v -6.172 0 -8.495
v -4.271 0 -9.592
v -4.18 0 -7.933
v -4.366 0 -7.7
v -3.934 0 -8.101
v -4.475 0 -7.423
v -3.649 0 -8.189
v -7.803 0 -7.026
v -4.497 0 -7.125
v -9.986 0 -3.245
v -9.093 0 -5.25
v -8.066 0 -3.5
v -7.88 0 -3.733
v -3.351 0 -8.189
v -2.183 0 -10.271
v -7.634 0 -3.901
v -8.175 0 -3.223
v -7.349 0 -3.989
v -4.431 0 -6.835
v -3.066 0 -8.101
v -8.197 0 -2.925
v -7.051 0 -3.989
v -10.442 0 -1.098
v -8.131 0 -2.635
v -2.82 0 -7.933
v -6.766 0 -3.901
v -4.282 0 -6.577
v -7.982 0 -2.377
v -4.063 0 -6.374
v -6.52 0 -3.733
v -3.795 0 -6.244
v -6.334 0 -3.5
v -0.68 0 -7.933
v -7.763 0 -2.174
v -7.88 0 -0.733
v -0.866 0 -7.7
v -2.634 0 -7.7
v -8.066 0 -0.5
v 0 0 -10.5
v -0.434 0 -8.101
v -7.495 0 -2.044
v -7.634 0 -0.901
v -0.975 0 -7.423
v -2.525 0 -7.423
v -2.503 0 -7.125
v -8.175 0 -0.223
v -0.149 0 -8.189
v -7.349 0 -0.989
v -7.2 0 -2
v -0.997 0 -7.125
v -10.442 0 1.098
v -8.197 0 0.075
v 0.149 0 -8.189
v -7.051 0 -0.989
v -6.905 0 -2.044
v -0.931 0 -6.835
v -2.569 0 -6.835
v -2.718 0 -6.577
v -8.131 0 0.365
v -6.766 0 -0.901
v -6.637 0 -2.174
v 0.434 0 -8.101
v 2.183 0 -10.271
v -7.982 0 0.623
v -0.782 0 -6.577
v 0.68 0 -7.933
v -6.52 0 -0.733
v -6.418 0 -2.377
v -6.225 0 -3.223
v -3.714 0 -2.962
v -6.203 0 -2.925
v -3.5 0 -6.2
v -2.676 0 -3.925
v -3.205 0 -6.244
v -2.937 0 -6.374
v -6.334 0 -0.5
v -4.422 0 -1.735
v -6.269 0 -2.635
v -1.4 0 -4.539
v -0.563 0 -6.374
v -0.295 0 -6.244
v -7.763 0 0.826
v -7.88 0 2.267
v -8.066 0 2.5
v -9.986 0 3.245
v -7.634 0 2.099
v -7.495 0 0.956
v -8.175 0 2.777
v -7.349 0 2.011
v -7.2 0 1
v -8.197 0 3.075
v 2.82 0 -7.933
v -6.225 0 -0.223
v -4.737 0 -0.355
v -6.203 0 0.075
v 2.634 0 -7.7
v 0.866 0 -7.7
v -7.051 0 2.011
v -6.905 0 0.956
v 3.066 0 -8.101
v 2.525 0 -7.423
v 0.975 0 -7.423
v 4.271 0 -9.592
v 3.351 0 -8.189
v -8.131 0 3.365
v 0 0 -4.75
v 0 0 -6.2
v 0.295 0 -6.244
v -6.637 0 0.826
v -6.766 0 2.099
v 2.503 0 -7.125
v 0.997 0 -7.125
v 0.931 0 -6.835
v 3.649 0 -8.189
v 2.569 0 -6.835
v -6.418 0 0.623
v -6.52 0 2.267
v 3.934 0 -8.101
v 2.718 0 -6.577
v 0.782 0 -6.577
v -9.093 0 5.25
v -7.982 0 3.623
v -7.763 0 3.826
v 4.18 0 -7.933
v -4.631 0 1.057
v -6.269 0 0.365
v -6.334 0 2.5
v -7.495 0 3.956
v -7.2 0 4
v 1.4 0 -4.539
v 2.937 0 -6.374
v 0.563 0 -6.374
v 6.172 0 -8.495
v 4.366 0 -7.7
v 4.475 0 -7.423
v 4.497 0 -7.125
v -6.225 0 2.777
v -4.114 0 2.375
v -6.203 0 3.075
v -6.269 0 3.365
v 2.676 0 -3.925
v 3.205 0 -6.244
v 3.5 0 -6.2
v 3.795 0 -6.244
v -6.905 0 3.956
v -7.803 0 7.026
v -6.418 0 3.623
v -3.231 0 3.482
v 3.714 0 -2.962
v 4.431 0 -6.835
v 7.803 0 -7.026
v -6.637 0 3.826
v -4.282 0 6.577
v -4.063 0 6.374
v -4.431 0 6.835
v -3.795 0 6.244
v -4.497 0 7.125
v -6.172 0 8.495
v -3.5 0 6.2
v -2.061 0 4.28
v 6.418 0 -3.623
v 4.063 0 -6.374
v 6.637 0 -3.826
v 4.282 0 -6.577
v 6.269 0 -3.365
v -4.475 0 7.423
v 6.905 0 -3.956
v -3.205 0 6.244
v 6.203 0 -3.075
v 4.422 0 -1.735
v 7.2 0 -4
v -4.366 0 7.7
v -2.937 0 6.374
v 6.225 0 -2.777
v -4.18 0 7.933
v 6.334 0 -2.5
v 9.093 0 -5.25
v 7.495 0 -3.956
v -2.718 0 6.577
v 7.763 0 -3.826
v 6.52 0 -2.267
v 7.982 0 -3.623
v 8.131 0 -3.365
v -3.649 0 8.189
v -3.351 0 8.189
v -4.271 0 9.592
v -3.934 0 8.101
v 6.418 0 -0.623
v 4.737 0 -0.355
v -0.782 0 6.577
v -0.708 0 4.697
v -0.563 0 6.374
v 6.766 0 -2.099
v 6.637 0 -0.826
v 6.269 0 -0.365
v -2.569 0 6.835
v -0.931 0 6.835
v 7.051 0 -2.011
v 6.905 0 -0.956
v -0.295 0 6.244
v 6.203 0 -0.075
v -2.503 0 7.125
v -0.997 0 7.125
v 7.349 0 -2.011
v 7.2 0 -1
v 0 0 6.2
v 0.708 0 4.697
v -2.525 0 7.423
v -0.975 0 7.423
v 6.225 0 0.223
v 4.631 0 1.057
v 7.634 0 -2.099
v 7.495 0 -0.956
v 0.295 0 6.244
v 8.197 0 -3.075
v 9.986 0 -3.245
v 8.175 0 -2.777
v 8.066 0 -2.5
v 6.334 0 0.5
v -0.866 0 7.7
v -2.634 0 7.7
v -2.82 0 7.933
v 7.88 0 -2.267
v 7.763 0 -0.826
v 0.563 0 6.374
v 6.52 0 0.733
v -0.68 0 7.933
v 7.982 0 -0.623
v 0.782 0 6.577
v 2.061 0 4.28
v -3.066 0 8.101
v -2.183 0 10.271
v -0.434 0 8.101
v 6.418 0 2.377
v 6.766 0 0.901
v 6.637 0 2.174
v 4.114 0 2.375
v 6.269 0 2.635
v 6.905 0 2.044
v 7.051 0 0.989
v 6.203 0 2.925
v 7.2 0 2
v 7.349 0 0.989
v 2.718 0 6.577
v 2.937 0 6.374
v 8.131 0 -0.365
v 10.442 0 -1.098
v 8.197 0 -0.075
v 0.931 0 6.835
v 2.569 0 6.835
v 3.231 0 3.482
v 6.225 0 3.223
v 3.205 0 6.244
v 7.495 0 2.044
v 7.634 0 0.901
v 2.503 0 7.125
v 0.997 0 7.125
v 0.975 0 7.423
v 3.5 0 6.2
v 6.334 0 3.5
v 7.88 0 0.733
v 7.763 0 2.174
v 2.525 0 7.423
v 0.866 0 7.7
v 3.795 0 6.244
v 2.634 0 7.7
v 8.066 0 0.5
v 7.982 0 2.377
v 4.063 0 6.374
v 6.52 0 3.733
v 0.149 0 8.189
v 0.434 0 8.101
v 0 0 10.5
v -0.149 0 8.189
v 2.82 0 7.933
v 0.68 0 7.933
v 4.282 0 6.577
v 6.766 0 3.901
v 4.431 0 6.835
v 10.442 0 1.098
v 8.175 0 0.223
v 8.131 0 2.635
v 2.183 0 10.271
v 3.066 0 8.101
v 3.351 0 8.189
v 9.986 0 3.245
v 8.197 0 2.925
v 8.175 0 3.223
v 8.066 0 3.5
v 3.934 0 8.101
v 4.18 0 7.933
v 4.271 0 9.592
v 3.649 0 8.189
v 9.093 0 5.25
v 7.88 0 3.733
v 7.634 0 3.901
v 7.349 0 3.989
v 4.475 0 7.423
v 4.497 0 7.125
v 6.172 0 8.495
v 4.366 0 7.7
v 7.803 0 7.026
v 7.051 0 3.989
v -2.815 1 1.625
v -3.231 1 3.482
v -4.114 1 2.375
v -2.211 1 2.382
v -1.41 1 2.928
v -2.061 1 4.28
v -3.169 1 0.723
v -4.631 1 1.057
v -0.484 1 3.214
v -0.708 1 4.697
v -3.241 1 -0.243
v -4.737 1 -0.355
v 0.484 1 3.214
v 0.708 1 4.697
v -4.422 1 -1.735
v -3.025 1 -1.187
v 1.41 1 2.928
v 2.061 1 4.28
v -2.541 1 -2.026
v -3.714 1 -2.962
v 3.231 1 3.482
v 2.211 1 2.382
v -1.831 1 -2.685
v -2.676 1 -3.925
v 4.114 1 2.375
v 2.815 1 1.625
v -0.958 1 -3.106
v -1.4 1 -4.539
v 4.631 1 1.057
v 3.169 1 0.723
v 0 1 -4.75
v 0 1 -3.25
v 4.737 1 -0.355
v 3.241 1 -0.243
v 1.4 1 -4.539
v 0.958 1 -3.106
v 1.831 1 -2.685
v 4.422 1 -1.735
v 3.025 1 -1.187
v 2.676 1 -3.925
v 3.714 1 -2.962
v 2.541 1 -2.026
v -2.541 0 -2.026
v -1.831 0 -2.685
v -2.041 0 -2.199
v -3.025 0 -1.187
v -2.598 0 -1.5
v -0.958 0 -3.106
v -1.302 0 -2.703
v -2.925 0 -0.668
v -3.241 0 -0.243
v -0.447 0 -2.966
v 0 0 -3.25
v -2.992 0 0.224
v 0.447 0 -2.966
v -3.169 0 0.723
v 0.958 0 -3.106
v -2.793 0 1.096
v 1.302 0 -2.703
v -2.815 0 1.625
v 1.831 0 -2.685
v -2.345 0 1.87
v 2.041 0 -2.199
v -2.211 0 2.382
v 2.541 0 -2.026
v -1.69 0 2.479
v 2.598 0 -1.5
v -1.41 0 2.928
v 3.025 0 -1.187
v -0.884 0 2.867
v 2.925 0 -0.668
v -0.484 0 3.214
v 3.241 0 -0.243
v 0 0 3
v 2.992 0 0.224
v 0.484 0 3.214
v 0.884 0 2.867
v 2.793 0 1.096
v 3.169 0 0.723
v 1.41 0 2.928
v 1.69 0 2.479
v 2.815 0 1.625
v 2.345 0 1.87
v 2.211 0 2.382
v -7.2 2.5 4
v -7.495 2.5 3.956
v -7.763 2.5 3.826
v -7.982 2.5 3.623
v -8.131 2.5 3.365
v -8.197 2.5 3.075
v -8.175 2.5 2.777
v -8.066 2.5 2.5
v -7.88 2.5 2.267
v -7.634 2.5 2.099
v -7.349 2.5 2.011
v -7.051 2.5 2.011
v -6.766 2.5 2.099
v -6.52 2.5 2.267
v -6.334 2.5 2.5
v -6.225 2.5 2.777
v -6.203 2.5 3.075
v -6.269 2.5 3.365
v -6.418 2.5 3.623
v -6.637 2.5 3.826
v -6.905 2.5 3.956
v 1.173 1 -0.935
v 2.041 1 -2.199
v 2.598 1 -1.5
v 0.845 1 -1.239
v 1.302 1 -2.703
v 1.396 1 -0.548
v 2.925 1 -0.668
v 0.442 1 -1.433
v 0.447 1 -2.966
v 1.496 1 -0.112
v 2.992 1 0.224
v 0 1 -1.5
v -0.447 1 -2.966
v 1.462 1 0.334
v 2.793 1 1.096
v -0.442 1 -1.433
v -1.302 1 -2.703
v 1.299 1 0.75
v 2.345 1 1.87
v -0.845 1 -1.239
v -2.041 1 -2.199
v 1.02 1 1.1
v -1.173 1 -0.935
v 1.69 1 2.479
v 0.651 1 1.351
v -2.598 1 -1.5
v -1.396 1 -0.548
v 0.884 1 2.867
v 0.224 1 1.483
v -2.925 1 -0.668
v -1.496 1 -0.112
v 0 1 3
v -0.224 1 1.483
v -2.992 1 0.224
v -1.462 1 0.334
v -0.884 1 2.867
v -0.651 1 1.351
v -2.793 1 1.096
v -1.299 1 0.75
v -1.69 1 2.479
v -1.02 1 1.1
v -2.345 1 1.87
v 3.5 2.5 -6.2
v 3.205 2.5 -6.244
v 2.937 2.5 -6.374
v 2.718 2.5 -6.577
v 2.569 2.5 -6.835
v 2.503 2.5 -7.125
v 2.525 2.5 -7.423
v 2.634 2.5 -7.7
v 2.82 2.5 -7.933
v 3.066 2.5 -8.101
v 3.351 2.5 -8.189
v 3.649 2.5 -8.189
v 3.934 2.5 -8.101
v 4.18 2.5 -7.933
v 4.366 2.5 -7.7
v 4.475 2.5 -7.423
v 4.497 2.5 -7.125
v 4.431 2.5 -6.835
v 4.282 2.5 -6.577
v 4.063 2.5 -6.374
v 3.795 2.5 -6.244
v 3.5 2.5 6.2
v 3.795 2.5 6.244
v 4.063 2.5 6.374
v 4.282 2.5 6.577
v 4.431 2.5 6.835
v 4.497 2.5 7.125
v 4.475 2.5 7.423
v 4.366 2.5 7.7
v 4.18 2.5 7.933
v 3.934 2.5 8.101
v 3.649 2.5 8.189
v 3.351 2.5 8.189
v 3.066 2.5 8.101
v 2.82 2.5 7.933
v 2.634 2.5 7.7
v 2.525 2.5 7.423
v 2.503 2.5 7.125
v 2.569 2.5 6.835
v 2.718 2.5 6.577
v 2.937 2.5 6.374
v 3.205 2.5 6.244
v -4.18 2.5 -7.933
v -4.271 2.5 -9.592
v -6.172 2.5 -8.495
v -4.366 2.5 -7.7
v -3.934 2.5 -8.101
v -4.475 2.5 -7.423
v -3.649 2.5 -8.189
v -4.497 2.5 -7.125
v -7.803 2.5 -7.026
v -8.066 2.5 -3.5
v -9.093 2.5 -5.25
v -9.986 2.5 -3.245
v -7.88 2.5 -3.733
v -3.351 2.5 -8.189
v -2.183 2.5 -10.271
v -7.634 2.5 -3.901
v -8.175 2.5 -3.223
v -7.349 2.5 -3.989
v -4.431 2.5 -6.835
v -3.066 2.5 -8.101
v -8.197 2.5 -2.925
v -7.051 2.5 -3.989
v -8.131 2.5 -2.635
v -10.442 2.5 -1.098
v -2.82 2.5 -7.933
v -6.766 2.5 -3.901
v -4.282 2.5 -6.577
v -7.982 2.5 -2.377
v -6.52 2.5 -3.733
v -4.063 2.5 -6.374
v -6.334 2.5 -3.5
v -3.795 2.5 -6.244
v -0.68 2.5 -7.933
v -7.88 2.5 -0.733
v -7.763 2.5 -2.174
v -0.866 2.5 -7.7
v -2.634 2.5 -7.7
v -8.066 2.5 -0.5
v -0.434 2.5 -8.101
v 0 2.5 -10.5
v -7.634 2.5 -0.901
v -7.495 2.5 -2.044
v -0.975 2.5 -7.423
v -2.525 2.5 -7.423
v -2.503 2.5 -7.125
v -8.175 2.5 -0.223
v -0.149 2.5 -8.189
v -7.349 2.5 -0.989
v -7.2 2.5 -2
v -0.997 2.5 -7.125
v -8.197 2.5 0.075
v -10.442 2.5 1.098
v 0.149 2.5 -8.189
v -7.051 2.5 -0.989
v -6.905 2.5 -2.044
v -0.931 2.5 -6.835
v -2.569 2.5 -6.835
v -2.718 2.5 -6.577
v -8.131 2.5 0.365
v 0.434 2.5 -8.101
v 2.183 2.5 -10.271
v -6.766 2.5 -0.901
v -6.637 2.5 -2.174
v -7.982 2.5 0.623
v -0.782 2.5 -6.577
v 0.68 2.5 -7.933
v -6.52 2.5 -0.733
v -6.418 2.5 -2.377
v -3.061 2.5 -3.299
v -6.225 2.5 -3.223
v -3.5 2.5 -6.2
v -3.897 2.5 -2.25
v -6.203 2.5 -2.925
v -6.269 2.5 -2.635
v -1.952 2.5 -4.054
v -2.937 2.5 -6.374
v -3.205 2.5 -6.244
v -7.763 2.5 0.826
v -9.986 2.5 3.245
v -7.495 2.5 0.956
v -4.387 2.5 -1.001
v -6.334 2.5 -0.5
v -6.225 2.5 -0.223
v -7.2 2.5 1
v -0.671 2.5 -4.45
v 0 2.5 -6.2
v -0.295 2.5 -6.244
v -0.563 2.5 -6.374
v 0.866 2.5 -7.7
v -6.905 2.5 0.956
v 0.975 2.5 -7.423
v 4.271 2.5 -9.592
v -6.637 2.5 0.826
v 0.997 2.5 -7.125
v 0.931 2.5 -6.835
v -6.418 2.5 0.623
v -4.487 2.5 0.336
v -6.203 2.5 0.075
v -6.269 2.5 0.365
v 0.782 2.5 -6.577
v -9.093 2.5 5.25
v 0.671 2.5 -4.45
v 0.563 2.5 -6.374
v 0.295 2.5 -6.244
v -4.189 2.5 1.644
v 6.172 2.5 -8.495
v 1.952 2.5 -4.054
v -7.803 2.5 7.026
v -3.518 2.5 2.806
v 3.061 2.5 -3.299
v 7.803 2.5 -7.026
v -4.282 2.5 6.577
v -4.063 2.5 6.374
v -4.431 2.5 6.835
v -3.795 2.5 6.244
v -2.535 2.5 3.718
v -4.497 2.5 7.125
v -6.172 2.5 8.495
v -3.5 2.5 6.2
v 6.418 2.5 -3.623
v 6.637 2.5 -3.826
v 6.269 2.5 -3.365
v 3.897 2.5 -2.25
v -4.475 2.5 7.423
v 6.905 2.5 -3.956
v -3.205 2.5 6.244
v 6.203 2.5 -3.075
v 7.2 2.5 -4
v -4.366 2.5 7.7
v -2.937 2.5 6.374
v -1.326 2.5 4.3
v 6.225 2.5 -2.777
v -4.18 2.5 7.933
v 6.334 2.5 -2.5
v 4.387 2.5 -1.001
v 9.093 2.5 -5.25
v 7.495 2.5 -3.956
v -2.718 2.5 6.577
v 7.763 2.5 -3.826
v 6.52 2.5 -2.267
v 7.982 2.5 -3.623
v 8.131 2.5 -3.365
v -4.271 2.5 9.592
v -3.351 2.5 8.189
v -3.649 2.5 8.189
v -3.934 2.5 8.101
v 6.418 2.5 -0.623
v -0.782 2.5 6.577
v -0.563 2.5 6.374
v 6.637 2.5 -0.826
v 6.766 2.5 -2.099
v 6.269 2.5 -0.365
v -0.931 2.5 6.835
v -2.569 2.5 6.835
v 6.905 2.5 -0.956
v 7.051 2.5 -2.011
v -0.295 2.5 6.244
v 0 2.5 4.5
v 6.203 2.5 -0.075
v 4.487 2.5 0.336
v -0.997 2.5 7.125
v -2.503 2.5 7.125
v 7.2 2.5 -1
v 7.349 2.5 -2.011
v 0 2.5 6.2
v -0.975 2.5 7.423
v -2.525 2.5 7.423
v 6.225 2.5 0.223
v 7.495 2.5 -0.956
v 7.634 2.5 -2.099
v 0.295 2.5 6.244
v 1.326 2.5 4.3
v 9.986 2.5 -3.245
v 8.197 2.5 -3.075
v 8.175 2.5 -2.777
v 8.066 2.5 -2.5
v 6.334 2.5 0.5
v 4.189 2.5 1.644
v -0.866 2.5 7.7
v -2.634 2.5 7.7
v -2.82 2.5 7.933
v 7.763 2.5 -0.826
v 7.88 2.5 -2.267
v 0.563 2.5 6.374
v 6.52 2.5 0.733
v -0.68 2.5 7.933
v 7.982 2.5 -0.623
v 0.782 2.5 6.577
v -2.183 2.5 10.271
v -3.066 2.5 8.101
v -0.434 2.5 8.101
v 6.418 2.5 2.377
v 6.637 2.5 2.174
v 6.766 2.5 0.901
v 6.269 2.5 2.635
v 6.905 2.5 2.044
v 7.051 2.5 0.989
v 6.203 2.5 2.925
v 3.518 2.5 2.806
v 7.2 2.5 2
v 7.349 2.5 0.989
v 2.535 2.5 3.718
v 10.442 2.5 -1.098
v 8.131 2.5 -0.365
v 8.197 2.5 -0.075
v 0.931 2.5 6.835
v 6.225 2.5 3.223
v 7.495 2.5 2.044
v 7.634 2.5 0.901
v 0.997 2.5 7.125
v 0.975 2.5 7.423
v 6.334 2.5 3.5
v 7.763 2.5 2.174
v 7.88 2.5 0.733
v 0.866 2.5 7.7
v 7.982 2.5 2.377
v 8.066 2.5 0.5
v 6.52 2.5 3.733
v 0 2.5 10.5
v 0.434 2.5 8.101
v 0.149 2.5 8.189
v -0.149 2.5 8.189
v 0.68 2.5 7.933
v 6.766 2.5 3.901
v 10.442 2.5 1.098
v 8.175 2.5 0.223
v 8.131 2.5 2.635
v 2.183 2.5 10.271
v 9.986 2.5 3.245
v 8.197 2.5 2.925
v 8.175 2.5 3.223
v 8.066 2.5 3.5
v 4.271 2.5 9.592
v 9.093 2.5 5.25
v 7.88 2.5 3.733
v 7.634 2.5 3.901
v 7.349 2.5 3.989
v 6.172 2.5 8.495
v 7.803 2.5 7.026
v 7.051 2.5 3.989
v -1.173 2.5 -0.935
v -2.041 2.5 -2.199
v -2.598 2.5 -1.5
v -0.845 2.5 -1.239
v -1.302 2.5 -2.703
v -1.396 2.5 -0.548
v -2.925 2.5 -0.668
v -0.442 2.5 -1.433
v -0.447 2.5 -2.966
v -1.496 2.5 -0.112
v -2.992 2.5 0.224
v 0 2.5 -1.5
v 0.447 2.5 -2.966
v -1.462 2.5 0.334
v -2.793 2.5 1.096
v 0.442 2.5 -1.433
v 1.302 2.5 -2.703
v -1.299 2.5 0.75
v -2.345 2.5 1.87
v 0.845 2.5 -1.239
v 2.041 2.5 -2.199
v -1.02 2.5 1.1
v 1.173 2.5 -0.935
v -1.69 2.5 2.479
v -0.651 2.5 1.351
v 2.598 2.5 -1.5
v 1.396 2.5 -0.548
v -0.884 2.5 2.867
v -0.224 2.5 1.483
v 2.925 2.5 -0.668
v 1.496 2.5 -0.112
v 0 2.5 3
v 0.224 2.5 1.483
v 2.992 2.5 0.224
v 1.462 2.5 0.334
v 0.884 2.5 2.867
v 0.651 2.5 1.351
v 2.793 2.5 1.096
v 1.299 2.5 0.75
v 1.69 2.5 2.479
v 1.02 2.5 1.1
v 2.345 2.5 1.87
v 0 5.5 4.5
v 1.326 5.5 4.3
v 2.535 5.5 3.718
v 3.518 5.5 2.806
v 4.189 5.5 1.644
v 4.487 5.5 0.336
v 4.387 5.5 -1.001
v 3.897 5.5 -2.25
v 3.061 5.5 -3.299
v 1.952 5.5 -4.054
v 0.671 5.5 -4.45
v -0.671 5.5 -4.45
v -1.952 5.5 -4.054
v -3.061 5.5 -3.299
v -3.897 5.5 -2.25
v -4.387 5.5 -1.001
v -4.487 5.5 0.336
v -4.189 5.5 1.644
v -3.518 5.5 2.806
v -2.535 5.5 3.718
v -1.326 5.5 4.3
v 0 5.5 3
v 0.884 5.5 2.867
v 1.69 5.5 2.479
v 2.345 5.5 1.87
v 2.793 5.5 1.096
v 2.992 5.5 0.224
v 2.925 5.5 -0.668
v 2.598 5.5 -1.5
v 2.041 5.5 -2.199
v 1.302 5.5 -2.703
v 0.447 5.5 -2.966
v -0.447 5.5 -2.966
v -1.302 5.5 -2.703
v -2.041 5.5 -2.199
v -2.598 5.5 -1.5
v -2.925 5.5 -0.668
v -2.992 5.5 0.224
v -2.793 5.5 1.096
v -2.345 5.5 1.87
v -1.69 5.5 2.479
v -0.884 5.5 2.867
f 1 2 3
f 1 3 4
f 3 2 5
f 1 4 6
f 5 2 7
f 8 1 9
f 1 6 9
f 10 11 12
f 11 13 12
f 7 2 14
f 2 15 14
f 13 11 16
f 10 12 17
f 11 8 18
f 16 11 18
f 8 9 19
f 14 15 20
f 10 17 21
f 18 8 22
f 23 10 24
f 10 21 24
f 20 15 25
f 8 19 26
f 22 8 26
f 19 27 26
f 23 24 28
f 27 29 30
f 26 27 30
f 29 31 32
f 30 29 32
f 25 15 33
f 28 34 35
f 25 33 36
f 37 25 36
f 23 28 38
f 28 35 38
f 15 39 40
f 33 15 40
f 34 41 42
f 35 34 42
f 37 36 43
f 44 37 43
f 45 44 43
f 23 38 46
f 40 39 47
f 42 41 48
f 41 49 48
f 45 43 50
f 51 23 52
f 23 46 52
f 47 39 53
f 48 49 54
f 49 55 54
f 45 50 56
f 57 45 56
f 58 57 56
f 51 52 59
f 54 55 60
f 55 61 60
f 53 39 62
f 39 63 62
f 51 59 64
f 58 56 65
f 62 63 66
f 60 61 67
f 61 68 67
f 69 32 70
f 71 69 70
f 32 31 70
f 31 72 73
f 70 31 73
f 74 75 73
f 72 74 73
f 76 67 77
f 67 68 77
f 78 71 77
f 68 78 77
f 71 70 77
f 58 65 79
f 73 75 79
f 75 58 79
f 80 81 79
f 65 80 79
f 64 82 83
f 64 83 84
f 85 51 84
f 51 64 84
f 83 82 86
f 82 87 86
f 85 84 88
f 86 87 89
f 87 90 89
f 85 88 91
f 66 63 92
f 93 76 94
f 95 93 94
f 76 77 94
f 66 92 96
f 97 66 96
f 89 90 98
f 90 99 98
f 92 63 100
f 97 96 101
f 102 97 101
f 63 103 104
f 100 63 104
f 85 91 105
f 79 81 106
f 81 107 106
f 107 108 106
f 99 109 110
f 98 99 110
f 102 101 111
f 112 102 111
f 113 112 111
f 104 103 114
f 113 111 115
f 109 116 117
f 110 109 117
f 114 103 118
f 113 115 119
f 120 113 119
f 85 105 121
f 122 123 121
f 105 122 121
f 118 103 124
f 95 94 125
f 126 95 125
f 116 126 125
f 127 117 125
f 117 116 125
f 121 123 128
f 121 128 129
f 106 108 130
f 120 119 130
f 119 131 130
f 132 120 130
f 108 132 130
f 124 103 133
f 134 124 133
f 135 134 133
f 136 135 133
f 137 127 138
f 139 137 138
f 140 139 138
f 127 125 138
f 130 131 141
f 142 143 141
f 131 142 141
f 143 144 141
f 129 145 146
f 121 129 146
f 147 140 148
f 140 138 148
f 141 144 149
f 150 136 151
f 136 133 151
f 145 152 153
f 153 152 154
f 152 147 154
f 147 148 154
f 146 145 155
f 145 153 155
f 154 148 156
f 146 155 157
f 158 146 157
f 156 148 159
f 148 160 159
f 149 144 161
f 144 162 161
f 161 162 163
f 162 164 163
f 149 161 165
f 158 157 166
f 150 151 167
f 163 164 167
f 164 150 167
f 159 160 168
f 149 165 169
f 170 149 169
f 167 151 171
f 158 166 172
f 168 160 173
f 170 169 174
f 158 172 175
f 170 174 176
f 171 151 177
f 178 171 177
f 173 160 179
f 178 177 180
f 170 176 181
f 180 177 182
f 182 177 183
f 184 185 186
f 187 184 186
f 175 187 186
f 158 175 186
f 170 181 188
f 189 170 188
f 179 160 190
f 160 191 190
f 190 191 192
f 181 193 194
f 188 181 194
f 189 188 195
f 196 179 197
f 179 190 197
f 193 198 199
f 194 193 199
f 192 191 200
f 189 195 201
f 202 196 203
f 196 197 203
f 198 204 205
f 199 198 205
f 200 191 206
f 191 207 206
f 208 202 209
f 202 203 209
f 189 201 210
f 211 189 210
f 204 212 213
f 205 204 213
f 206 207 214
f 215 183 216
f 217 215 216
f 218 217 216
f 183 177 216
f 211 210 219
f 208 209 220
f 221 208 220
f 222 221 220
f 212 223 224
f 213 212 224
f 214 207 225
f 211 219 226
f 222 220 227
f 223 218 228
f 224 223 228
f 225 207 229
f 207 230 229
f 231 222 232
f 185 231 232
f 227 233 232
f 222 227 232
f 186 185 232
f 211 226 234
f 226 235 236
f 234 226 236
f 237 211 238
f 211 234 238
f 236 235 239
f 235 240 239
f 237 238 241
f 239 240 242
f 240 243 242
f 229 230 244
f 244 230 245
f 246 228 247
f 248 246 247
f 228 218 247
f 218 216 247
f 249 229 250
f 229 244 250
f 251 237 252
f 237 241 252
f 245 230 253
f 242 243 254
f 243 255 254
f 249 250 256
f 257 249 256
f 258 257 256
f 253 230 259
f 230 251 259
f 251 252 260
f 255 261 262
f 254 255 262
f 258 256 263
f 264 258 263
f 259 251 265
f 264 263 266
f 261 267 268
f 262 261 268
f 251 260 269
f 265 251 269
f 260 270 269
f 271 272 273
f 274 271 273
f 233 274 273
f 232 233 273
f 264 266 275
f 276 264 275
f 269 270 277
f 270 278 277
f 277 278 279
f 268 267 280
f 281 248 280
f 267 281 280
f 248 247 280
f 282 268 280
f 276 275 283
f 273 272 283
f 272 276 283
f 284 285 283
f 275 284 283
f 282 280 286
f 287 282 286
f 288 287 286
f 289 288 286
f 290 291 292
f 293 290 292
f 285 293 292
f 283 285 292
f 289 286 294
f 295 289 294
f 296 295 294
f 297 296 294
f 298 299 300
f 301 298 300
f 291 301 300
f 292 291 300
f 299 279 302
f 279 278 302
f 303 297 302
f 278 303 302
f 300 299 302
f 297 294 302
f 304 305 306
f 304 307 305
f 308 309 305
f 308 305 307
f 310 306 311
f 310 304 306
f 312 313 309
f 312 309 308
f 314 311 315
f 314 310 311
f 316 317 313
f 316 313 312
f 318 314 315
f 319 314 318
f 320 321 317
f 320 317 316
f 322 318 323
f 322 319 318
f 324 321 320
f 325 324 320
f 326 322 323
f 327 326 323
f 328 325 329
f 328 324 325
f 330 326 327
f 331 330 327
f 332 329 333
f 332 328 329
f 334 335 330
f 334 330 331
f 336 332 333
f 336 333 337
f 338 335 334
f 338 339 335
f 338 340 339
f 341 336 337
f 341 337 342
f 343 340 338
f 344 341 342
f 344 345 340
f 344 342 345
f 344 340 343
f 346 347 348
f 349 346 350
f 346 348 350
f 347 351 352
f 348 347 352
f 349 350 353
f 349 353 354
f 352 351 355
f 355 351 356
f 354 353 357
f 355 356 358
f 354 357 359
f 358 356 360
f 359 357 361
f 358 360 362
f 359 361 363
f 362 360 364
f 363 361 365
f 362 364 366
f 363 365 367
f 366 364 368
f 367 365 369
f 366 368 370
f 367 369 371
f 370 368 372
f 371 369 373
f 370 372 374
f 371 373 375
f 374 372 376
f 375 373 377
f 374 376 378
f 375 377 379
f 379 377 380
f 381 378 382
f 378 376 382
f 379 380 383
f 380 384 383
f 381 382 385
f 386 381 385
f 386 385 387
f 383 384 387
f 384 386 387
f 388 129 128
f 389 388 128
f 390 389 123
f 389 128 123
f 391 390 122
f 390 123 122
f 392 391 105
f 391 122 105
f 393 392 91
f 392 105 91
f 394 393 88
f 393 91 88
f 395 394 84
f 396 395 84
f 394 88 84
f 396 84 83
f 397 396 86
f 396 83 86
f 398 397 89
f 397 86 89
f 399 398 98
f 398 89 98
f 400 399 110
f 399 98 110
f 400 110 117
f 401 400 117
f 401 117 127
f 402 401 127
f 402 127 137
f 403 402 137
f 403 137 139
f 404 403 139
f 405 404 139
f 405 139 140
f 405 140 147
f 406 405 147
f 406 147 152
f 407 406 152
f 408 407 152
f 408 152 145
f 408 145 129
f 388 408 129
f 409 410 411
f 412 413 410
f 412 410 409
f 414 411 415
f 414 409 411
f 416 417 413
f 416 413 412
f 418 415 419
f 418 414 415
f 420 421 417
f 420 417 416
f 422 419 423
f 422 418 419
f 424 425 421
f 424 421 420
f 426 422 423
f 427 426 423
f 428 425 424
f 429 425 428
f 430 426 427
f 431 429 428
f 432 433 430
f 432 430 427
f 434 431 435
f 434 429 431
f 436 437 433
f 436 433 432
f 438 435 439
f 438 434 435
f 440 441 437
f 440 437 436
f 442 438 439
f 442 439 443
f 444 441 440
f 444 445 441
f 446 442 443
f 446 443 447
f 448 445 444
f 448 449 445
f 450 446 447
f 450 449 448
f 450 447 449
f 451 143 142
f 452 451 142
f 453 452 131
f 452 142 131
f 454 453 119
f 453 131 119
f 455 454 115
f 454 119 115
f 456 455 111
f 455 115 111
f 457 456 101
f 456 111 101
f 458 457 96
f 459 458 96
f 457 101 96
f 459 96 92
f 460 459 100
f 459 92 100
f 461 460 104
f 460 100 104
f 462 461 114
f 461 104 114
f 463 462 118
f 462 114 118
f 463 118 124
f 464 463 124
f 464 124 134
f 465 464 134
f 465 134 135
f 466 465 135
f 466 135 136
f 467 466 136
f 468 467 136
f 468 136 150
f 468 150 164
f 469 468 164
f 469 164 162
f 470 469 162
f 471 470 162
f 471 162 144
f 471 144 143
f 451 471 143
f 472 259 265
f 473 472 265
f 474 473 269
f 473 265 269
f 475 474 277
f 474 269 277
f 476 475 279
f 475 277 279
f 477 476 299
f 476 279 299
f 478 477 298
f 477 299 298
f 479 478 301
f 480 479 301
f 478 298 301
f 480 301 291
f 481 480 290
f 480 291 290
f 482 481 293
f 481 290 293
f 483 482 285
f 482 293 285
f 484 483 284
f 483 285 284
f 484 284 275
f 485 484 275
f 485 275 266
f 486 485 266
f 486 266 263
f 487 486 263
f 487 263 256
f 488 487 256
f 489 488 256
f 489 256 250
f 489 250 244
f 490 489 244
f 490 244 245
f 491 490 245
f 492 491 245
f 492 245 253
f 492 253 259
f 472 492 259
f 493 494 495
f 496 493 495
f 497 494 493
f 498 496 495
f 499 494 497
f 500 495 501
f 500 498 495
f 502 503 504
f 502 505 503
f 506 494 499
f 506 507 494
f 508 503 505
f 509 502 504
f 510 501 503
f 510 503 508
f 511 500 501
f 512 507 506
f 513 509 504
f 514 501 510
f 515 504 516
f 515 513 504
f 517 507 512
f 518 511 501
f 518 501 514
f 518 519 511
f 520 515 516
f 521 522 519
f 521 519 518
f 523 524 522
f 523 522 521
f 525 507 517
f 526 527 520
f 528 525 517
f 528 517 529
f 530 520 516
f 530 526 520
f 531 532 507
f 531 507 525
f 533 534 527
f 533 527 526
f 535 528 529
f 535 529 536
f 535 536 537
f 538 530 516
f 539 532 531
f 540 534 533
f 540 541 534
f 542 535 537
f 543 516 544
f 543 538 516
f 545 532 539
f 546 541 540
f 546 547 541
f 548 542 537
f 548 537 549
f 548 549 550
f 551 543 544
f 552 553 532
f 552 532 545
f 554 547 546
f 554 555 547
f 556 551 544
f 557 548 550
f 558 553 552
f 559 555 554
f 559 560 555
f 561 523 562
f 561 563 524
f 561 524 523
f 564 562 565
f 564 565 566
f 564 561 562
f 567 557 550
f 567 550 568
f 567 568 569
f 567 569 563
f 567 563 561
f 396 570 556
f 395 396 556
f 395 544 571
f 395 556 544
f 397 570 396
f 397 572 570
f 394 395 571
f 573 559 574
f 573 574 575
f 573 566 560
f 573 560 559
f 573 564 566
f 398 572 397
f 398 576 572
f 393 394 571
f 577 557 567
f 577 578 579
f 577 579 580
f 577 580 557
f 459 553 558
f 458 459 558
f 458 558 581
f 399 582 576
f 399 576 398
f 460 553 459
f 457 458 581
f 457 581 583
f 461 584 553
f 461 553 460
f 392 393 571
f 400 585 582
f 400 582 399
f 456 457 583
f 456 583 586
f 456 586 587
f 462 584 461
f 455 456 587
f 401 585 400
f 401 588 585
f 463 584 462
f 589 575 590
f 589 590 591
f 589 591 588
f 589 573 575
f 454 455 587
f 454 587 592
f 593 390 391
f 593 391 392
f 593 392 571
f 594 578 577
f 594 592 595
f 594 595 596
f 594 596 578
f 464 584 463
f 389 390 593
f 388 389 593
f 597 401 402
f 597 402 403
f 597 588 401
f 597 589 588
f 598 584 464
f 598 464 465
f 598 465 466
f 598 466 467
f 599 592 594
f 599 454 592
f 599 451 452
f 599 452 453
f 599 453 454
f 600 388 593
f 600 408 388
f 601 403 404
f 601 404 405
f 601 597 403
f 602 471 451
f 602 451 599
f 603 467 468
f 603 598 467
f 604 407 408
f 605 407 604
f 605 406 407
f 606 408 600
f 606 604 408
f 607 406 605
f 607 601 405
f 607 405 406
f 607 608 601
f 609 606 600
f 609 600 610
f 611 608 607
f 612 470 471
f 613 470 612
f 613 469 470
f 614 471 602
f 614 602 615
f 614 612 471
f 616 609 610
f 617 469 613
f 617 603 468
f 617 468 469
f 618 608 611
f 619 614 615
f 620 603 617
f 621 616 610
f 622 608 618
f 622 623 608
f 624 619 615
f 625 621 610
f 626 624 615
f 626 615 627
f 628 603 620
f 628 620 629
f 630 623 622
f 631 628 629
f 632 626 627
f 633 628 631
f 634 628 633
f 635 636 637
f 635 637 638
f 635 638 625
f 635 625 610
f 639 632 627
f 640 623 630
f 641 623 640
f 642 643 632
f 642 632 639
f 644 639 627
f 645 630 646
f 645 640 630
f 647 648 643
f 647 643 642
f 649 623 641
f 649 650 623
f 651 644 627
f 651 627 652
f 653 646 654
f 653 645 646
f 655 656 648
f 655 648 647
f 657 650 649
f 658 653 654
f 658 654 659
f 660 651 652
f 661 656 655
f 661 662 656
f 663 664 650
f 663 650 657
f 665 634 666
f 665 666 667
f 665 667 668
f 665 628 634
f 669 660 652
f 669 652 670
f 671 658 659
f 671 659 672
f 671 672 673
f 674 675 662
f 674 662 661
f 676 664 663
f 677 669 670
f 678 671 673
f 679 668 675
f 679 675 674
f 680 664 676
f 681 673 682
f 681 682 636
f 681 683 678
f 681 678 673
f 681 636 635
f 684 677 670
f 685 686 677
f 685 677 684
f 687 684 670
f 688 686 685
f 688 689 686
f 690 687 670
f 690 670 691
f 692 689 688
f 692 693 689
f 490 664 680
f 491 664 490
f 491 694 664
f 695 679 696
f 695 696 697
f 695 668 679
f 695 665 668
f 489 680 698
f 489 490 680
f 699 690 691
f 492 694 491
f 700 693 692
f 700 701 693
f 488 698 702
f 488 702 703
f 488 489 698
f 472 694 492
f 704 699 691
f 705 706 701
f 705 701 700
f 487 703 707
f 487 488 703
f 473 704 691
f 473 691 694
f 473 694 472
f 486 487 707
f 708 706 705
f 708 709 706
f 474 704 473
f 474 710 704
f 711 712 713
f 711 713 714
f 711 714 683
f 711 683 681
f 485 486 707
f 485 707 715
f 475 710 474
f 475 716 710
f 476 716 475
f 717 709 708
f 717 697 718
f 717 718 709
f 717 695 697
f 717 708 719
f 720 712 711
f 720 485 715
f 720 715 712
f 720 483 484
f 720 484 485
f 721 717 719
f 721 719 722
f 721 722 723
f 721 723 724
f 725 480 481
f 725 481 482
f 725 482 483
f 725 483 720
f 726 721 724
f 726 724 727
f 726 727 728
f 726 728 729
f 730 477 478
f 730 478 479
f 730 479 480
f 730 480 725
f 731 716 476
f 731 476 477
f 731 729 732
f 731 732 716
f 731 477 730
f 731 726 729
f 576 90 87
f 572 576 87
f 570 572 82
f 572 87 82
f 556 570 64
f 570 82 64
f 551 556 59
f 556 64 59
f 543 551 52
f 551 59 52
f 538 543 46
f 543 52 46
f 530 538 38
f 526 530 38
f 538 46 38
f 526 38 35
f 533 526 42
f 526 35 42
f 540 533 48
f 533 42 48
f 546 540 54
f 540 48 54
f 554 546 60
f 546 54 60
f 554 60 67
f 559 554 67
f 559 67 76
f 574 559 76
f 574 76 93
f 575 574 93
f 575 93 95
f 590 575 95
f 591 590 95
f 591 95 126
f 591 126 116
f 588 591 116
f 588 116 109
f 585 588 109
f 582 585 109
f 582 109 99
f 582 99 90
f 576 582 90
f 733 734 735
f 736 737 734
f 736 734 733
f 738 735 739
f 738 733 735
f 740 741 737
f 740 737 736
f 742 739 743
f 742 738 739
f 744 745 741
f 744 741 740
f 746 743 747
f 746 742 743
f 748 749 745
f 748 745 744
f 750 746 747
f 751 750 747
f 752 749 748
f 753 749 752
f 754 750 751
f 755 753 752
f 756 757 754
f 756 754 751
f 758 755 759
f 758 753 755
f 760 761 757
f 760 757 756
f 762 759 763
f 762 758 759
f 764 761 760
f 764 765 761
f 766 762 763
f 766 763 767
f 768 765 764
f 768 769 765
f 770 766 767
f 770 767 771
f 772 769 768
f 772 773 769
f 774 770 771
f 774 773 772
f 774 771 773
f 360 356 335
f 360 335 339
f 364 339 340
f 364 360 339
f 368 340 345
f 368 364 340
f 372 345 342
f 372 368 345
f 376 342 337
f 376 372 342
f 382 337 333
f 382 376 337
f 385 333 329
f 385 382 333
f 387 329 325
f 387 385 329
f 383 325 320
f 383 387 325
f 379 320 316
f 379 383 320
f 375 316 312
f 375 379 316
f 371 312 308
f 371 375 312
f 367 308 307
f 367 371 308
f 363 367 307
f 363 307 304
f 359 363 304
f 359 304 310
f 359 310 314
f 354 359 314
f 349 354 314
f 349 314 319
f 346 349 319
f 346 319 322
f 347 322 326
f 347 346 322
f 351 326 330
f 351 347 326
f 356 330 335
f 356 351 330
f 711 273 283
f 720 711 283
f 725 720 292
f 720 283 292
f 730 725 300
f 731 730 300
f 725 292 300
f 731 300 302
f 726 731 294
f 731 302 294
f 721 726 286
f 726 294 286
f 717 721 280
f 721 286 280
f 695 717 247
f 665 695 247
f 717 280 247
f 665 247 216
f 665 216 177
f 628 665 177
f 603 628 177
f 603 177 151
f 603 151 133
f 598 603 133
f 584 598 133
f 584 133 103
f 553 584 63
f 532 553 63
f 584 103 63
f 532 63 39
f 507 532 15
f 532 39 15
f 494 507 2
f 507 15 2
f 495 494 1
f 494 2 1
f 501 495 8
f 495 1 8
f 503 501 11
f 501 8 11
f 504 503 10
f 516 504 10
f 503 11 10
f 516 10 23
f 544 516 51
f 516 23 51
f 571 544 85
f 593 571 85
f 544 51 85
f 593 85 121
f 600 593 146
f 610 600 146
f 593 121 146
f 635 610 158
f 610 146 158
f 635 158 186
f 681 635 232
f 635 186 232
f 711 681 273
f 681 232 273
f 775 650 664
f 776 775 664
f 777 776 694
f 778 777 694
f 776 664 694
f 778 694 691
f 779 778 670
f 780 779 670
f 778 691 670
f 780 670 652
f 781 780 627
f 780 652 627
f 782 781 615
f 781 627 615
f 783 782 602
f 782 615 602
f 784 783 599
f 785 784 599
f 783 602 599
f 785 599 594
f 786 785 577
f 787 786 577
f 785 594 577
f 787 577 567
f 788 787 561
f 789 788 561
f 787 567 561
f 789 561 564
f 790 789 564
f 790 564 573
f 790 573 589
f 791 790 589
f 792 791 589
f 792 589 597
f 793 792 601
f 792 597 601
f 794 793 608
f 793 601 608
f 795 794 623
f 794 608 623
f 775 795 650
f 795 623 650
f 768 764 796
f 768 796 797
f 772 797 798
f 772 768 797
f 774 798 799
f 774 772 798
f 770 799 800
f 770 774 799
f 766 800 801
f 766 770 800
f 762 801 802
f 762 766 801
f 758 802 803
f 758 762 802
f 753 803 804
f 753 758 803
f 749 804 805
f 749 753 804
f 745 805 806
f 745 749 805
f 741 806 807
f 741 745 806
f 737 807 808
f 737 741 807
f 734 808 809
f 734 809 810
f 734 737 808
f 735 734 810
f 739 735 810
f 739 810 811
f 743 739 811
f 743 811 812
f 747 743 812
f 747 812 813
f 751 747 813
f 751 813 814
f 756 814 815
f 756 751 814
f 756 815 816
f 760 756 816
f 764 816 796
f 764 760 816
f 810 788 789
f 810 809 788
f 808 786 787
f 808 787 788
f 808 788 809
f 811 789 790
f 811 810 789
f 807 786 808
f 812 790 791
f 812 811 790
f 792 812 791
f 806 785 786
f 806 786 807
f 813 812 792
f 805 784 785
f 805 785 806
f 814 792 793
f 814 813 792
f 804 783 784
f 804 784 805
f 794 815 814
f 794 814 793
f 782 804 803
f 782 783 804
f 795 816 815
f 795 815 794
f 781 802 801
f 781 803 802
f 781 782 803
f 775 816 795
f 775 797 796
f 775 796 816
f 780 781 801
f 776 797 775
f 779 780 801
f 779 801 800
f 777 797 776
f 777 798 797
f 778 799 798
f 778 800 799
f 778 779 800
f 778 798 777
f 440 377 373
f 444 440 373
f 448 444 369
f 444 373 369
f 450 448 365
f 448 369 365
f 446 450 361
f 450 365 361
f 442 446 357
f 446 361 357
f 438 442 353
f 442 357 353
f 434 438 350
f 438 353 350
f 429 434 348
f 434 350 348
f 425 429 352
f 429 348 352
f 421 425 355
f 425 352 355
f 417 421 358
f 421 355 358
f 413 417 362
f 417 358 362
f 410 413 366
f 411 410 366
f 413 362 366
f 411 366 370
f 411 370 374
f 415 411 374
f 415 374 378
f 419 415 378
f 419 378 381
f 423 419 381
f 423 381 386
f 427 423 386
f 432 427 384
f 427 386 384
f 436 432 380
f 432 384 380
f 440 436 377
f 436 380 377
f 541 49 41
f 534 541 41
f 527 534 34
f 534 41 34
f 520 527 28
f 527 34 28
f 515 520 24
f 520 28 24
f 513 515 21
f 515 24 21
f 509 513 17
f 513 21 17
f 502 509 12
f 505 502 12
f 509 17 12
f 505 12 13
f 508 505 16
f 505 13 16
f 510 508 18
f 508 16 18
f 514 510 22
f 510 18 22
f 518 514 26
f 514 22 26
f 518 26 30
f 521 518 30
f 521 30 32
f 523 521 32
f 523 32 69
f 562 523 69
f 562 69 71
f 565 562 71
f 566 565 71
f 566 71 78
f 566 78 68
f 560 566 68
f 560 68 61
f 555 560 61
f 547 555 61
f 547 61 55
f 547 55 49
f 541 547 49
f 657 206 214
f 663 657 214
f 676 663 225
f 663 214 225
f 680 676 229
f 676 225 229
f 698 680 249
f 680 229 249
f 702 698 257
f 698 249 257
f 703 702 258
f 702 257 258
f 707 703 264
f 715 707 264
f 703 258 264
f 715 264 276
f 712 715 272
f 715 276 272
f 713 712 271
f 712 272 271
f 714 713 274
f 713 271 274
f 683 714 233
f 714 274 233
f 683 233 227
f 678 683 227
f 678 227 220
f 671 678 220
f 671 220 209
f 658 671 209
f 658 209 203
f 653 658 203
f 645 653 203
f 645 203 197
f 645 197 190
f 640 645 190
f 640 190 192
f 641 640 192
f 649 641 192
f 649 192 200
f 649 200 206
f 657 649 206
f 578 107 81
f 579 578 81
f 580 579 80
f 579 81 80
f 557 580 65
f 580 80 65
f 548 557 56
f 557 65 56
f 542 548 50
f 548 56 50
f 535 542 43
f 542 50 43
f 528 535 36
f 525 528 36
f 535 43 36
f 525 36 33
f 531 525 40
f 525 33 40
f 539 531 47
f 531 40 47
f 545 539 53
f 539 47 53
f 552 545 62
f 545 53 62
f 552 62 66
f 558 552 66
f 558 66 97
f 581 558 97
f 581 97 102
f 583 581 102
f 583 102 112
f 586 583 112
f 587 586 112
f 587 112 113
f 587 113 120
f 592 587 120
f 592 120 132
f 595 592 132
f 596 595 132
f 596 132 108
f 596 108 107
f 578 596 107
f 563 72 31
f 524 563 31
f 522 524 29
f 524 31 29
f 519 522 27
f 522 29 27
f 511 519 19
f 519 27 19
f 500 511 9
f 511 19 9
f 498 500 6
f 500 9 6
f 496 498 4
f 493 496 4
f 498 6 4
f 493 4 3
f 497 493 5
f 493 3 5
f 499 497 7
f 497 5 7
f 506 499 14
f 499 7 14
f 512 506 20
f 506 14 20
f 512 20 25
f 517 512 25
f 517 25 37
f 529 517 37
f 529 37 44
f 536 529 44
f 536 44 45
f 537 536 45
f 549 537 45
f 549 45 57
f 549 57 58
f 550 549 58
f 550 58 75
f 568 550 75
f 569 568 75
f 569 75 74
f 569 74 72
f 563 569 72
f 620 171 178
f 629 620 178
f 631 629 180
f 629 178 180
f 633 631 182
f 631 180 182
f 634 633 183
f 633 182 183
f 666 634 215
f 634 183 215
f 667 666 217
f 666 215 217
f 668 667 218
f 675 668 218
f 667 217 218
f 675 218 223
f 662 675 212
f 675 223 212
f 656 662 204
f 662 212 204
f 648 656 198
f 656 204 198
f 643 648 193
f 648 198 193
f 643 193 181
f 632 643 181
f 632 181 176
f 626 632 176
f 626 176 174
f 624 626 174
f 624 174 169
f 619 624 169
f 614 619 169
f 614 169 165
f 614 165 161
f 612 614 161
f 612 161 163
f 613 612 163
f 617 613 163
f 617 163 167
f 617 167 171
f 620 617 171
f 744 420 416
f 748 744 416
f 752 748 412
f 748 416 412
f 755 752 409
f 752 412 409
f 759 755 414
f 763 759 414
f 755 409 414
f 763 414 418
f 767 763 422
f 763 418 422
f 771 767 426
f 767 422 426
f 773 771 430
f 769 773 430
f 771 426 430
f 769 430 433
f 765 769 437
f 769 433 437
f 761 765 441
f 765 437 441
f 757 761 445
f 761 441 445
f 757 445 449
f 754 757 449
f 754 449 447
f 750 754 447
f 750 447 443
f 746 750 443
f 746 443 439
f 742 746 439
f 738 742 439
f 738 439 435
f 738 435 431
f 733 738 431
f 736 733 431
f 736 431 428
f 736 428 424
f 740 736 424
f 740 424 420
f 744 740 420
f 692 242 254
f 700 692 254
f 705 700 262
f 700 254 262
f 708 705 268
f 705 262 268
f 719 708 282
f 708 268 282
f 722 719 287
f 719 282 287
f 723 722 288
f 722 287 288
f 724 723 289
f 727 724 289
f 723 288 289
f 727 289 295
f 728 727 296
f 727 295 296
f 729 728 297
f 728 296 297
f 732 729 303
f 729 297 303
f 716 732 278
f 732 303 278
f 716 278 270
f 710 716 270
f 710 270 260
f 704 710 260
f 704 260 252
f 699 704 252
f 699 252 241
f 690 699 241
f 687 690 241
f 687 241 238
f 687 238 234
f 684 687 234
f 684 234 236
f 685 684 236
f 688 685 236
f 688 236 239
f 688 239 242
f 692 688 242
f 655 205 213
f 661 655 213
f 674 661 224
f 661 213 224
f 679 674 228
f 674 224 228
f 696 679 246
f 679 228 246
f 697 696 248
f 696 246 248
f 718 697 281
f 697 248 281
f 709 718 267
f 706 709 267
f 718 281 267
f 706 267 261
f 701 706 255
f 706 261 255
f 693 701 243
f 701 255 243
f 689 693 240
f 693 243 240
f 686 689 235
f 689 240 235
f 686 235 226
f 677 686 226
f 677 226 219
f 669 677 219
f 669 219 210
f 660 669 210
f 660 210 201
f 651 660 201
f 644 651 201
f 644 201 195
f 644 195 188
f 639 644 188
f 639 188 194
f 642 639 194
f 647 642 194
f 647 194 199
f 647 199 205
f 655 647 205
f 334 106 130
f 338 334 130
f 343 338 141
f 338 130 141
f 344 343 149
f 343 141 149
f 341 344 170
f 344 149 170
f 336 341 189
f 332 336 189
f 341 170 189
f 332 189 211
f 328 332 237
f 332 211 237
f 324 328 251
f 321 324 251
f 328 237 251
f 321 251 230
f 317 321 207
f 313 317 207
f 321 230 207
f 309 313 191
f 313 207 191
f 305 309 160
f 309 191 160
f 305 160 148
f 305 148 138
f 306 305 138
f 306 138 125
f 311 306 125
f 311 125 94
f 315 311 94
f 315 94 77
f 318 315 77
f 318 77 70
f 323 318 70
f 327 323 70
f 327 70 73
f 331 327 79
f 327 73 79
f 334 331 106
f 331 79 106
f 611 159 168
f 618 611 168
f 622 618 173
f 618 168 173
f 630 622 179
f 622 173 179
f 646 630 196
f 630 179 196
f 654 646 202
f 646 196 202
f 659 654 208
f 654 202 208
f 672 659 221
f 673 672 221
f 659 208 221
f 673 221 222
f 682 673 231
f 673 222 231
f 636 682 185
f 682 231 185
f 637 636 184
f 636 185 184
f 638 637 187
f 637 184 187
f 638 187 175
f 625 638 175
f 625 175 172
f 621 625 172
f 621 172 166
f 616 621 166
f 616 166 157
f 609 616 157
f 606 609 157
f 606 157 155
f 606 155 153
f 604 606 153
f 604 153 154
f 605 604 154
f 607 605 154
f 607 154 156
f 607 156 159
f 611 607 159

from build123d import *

# Parameters (mm, degrees)
CROQUIS1_R              = 10.5
SALIENTE_EXTRUIR1_DEPTH = 2.5
CROQUIS2_R              = 4.5
CROQUIS2_R_2            = 3
SALIENTE_EXTRUIR2_DEPTH = 3
CROQUIS4_R              = 4.75
CROQUIS4_R_2            = 3.25
CORTAR_EXTRUIR1_DEPTH   = 1
CROQUIS5_R              = 3
CORTAR_EXTRUIR2_DEPTH   = 1
CROQUIS6_R              = 1.5
CORTAR_EXTRUIR3_DEPTH   = 3
CROQUIS7_R              = 1
CORTAR_EXTRUIR4_DEPTH   = 3


with BuildPart() as part:
    # Croquis1 → Saliente-Extruir1 (new body)
    with BuildSketch(Plane(origin=(0, 0, 0), x_dir=(1, 0, 0), z_dir=(0, 1, 0))):
        with Locations(Location((0, 0, 0), (0, 0, 270))):
            Circle(CROQUIS1_R)
    extrude(amount=SALIENTE_EXTRUIR1_DEPTH)

    # Croquis2 → Saliente-Extruir2 (add)
    with BuildSketch(Plane(origin=(0, 2.5, 0), x_dir=(1, 0, 0), z_dir=(0, 1, 0))):
        with Locations(Location((0, 0, 0), (0, 0, 270))):
            Circle(CROQUIS2_R)
        with Locations(Location((0, 0, 0), (0, 0, 270))):
            Circle(CROQUIS2_R_2, mode=Mode.SUBTRACT)
    extrude(amount=SALIENTE_EXTRUIR2_DEPTH)

    # Croquis4 → Cortar-Extruir1 (cut)
    with BuildSketch(Plane.XZ):
        with Locations(Location((0, 0, 0), (0, 0, 270))):
            Circle(CROQUIS4_R)
        with Locations(Location((0, 0, 0), (0, 0, 270))):
            Circle(CROQUIS4_R_2, mode=Mode.SUBTRACT)
    extrude(amount=-CORTAR_EXTRUIR1_DEPTH, mode=Mode.SUBTRACT)

    # Croquis5 → Cortar-Extruir2 (cut)
    with BuildSketch(Plane.XZ):
        with Locations(Location((0, 0, 0), (0, 0, 90))):
            Circle(CROQUIS5_R)
    extrude(amount=-CORTAR_EXTRUIR2_DEPTH, mode=Mode.SUBTRACT)

    # Croquis6 → Cortar-Extruir3 (cut)
    with BuildSketch(Plane.XZ.offset(-1)):
        with Locations(Location((0, 0, 0), (0, 0, 270))):
            Circle(CROQUIS6_R)
    extrude(amount=-CORTAR_EXTRUIR3_DEPTH, mode=Mode.SUBTRACT)

    # Croquis7 → Cortar-Extruir4 (cut)
    with BuildSketch(Plane.XZ):
        with Locations(Location((0, 7.2, 0), (0, 0, 270))):
            Circle(CROQUIS7_R)
        with Locations(Location((0, -7.2, 0), (0, 0, 90))):
            Circle(CROQUIS7_R)
        with Locations(Location((7.2, 0, 0), (0, 0, 270))):
            Circle(CROQUIS7_R)
        with Locations(Location((-7.2, 0, 0), (0, 0, 90))):
            Circle(CROQUIS7_R)
        with Locations(Location((3.5, 7.2, 0), (0, 0, 270))):
            Circle(CROQUIS7_R)
        with Locations(Location((-3.5, 7.2, 0), (0, 0, 270))):
            Circle(CROQUIS7_R)
        with Locations(Location((3.5, -7.2, 0), (0, 0, 90))):
            Circle(CROQUIS7_R)
        with Locations(Location((-3.5, -7.2, 0), (0, 0, 90))):
            Circle(CROQUIS7_R)
        with Locations(Location((7.2, 3, 0), (0, 0, 270))):
            Circle(CROQUIS7_R)
        with Locations(Location((7.2, -3, 0), (0, 0, 270))):
            Circle(CROQUIS7_R)
        with Locations(Location((-7.2, -3, 0), (0, 0, 90))):
            Circle(CROQUIS7_R)
        with Locations(Location((-7.2, 3, 0), (0, 0, 90))):
            Circle(CROQUIS7_R)
    extrude(amount=-CORTAR_EXTRUIR4_DEPTH, mode=Mode.SUBTRACT)


solid = part.part
